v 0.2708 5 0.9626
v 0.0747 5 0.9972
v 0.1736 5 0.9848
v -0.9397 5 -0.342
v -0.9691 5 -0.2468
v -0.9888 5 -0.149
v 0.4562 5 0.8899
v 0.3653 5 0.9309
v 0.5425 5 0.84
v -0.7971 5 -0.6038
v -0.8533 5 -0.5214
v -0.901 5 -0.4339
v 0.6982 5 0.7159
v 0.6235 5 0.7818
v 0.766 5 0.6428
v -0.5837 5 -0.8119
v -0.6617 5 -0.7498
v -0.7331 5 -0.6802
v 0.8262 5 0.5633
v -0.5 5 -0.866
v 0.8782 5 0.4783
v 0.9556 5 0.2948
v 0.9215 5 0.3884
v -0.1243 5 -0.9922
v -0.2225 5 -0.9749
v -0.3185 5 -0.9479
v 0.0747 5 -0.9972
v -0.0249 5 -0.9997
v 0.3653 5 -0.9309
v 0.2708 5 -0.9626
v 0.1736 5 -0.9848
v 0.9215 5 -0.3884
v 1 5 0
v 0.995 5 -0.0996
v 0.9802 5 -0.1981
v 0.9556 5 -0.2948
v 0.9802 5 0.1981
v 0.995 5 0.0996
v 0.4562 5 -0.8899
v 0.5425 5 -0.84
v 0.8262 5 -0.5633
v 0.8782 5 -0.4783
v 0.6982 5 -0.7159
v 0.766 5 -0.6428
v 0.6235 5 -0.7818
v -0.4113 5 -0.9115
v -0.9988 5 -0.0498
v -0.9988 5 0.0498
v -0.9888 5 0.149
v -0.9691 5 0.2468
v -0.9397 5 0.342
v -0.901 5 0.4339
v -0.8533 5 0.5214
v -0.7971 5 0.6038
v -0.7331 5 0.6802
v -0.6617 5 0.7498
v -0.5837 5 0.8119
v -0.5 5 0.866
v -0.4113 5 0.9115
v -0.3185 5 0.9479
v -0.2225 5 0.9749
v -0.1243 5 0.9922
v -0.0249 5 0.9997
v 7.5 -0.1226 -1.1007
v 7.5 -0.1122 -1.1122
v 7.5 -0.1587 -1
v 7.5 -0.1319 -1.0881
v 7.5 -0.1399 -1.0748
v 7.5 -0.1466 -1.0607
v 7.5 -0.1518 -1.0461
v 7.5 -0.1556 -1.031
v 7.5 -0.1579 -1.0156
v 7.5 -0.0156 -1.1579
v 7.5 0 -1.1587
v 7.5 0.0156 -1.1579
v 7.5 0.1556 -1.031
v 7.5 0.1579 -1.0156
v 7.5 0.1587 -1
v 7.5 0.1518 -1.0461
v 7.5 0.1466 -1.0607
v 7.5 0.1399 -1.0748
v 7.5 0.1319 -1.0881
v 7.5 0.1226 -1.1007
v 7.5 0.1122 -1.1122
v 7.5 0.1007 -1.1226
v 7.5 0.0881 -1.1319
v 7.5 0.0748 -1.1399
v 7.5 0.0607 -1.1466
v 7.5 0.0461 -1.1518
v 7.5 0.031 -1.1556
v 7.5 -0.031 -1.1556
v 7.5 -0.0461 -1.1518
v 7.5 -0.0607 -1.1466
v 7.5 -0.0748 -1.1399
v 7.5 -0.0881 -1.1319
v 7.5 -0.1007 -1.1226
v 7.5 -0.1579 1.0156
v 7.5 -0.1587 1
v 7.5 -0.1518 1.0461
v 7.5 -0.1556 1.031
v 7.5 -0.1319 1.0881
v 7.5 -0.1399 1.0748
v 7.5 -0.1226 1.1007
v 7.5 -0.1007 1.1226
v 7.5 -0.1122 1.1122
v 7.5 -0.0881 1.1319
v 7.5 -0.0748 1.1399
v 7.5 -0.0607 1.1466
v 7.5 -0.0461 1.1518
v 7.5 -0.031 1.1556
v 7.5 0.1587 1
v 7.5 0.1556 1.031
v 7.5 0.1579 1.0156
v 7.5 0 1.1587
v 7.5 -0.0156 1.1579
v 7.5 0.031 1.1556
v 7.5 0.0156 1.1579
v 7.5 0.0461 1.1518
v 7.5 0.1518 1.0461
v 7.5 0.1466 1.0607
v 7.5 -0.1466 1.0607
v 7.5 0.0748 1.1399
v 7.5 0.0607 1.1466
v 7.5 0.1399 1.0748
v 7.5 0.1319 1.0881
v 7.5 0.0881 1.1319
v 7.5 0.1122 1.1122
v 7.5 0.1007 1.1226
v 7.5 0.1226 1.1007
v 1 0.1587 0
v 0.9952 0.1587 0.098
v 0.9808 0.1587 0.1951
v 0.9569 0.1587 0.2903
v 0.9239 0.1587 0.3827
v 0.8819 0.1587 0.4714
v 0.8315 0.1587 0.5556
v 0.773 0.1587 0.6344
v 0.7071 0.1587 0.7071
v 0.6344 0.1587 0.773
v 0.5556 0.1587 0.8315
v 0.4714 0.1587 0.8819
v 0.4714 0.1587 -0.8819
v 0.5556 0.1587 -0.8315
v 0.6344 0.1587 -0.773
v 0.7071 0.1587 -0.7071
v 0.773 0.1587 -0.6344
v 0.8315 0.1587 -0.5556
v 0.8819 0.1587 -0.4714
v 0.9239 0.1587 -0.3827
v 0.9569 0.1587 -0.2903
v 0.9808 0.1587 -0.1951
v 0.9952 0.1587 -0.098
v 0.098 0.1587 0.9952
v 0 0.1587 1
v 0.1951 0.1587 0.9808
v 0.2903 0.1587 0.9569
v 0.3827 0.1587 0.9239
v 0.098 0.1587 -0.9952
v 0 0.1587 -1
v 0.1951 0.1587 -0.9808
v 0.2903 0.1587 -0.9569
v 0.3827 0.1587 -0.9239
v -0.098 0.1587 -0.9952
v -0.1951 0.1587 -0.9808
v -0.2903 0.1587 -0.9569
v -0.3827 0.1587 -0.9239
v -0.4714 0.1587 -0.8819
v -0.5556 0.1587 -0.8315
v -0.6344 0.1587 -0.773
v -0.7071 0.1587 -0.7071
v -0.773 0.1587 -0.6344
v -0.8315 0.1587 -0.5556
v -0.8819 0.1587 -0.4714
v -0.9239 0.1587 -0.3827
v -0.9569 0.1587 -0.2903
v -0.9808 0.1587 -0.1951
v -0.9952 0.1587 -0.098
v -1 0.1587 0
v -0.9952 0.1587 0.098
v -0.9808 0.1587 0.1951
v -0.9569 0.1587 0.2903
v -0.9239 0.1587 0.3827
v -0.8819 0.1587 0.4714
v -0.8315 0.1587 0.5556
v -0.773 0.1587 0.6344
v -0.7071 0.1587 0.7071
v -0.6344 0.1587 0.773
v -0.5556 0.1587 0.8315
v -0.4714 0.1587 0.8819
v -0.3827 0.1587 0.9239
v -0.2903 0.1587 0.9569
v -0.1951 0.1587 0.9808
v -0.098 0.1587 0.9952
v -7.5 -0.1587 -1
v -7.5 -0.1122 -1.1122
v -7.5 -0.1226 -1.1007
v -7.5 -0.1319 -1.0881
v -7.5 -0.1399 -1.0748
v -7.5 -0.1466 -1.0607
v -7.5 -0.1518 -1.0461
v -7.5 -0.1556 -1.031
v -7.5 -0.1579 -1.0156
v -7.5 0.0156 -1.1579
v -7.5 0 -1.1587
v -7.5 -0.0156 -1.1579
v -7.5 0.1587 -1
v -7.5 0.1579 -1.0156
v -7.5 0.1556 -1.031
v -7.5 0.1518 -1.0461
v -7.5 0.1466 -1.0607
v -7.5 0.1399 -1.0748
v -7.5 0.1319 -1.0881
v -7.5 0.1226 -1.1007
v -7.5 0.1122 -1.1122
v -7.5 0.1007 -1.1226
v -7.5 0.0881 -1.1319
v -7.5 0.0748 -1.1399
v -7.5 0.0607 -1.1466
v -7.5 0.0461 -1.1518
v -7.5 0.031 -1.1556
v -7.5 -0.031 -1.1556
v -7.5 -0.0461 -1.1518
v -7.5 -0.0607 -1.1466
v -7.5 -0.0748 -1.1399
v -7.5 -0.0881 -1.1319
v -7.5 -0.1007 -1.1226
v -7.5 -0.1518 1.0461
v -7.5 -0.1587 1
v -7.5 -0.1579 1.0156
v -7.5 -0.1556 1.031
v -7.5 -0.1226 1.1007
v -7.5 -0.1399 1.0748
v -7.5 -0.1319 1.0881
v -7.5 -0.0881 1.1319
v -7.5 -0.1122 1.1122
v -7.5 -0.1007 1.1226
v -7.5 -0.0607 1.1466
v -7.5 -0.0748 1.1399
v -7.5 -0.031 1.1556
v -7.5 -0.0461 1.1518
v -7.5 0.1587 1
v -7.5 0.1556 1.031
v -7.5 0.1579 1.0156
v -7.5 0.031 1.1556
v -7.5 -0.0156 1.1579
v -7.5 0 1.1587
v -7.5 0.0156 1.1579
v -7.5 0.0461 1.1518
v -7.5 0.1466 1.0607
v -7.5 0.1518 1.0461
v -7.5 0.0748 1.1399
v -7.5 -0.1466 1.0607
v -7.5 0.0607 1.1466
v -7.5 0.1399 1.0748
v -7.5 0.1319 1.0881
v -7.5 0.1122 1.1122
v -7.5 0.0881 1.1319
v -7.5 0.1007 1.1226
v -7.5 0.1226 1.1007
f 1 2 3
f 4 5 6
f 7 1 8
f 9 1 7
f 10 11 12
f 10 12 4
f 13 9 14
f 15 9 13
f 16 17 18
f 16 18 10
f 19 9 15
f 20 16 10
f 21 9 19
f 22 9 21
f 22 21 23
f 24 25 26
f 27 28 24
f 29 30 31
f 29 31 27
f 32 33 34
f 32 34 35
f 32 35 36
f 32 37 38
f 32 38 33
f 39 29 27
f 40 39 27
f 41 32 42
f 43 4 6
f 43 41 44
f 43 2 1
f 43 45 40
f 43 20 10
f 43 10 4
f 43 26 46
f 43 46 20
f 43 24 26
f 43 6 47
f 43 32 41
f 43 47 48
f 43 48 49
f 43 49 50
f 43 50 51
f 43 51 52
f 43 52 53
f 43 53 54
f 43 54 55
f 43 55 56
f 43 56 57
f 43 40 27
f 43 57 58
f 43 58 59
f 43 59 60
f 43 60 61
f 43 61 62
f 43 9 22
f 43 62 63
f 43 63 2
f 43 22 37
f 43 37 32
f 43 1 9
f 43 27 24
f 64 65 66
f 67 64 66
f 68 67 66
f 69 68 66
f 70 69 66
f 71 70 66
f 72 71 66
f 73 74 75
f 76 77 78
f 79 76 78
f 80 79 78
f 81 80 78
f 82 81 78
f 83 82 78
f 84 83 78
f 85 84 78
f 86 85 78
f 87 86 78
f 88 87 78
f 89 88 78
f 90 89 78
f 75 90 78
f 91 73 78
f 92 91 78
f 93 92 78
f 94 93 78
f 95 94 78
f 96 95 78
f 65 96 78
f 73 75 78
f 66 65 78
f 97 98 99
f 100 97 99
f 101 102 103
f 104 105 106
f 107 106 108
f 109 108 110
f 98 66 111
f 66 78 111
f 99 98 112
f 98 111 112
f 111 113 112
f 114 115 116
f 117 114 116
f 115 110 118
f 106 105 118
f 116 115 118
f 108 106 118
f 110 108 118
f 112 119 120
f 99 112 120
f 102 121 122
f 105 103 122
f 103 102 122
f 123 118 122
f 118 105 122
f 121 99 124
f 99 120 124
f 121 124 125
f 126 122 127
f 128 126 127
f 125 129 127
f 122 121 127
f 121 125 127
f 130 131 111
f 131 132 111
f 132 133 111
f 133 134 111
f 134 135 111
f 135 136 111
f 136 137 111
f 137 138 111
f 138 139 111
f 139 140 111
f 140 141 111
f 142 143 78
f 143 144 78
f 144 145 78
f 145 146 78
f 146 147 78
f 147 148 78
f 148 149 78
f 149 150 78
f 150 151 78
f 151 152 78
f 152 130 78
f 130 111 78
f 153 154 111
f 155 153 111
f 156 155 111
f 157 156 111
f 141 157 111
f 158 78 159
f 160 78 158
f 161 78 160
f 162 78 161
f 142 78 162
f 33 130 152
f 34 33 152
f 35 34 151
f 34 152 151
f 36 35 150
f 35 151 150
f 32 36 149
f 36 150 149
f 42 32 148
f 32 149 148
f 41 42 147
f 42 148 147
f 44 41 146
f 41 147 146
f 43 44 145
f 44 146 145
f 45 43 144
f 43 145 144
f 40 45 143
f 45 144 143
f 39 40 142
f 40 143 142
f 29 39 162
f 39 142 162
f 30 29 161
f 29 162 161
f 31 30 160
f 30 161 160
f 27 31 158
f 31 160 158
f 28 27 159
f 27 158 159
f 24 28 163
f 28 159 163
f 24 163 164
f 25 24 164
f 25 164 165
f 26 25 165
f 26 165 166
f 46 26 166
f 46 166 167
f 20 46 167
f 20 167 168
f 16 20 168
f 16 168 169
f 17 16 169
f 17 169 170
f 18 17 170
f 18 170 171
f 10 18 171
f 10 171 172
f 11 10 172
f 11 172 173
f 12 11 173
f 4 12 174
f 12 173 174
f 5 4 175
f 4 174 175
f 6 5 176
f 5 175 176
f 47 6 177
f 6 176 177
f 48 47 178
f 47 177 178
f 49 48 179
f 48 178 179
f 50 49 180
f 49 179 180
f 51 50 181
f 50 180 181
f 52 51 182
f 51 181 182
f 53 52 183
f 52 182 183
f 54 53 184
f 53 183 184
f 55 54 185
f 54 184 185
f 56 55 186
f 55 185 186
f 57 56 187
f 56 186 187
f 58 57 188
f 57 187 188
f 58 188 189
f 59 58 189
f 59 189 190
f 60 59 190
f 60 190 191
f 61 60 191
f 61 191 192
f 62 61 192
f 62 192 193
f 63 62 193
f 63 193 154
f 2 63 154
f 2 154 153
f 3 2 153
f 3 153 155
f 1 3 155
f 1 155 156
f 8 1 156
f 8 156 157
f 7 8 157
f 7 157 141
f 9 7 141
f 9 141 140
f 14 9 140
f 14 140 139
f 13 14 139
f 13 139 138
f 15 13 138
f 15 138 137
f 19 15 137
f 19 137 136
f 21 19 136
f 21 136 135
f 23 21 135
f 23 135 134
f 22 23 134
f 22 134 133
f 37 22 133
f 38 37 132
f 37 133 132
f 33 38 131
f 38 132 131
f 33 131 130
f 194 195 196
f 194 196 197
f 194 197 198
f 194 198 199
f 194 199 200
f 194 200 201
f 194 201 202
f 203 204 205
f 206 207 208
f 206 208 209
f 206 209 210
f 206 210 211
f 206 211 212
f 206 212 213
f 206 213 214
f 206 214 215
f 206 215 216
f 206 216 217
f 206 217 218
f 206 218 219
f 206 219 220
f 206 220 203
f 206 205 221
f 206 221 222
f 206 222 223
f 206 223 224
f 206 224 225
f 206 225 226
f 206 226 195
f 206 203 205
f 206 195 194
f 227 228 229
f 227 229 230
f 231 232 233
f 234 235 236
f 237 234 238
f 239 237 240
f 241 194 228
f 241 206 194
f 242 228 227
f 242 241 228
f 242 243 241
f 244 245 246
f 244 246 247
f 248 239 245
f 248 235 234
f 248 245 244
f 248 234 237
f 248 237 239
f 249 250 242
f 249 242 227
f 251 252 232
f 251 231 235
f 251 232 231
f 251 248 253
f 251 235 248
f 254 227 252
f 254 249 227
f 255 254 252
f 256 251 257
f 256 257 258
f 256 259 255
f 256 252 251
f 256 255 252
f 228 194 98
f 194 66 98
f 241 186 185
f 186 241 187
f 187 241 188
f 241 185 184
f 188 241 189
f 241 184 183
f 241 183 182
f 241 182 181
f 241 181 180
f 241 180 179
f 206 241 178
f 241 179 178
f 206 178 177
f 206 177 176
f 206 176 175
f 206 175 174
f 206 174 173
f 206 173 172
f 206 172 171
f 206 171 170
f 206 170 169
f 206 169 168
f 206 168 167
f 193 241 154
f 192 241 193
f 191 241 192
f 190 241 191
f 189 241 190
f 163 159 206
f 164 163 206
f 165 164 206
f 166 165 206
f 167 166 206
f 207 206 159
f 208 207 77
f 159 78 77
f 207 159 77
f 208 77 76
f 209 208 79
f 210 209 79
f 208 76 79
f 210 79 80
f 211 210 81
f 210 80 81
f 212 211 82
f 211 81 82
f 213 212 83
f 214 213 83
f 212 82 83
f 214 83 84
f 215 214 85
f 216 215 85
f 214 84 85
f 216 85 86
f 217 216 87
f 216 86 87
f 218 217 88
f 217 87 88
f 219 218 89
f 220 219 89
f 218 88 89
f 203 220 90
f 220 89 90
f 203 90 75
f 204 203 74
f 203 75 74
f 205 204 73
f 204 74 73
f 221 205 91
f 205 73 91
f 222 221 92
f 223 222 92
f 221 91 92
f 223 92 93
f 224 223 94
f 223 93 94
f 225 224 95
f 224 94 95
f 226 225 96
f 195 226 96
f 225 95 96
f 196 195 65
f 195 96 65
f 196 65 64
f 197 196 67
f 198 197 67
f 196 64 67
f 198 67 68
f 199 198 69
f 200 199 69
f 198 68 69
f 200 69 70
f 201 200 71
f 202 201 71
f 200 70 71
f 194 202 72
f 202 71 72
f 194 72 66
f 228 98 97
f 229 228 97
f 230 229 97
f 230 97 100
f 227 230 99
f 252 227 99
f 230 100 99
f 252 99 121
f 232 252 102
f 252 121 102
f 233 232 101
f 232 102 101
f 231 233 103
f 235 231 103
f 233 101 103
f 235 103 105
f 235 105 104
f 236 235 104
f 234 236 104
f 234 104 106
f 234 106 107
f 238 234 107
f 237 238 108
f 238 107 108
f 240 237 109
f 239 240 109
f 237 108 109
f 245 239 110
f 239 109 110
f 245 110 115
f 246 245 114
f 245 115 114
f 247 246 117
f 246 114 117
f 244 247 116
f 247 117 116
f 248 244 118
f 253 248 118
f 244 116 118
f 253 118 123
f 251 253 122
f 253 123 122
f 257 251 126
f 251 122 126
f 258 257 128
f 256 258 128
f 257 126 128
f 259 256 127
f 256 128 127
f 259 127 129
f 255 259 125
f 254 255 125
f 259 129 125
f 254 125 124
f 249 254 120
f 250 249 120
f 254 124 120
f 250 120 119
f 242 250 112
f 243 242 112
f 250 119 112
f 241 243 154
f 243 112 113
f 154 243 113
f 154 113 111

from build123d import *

# Parameters (mm, degrees)
SKETCH3_R           = 1
BOSS_EXTRUDE1_DEPTH = 5
BOSS_EXTRUDE2_DEPTH = 7.5


with BuildPart() as part:
    # Sketch3 → Boss-Extrude1 (new body)
    with BuildSketch(Plane(origin=(0, 0, 0), x_dir=(1, 0, 0), z_dir=(0, 1, 0))):
        Circle(SKETCH3_R)
    extrude(amount=BOSS_EXTRUDE1_DEPTH)

    # Sketch4 → Boss-Extrude2 (add, symmetric)
    with BuildSketch(Plane(origin=(0, 0, 0), x_dir=(0, 0, -1), z_dir=(1, 0, 0))):
        with BuildLine():
            Line((-1, 0.158659908), (1, 0.158659908))
            ThreePointArc((1, 0.158659908), (1.158659908, 0), (1, -0.158659908))
            Line((1, -0.158659908), (-1, -0.158659908))
            ThreePointArc((-1, -0.158659908), (-1.158659908, 0), (-1, 0.158659908))
        make_face()
    extrude(amount=BOSS_EXTRUDE2_DEPTH, both=True)


solid = part.part
